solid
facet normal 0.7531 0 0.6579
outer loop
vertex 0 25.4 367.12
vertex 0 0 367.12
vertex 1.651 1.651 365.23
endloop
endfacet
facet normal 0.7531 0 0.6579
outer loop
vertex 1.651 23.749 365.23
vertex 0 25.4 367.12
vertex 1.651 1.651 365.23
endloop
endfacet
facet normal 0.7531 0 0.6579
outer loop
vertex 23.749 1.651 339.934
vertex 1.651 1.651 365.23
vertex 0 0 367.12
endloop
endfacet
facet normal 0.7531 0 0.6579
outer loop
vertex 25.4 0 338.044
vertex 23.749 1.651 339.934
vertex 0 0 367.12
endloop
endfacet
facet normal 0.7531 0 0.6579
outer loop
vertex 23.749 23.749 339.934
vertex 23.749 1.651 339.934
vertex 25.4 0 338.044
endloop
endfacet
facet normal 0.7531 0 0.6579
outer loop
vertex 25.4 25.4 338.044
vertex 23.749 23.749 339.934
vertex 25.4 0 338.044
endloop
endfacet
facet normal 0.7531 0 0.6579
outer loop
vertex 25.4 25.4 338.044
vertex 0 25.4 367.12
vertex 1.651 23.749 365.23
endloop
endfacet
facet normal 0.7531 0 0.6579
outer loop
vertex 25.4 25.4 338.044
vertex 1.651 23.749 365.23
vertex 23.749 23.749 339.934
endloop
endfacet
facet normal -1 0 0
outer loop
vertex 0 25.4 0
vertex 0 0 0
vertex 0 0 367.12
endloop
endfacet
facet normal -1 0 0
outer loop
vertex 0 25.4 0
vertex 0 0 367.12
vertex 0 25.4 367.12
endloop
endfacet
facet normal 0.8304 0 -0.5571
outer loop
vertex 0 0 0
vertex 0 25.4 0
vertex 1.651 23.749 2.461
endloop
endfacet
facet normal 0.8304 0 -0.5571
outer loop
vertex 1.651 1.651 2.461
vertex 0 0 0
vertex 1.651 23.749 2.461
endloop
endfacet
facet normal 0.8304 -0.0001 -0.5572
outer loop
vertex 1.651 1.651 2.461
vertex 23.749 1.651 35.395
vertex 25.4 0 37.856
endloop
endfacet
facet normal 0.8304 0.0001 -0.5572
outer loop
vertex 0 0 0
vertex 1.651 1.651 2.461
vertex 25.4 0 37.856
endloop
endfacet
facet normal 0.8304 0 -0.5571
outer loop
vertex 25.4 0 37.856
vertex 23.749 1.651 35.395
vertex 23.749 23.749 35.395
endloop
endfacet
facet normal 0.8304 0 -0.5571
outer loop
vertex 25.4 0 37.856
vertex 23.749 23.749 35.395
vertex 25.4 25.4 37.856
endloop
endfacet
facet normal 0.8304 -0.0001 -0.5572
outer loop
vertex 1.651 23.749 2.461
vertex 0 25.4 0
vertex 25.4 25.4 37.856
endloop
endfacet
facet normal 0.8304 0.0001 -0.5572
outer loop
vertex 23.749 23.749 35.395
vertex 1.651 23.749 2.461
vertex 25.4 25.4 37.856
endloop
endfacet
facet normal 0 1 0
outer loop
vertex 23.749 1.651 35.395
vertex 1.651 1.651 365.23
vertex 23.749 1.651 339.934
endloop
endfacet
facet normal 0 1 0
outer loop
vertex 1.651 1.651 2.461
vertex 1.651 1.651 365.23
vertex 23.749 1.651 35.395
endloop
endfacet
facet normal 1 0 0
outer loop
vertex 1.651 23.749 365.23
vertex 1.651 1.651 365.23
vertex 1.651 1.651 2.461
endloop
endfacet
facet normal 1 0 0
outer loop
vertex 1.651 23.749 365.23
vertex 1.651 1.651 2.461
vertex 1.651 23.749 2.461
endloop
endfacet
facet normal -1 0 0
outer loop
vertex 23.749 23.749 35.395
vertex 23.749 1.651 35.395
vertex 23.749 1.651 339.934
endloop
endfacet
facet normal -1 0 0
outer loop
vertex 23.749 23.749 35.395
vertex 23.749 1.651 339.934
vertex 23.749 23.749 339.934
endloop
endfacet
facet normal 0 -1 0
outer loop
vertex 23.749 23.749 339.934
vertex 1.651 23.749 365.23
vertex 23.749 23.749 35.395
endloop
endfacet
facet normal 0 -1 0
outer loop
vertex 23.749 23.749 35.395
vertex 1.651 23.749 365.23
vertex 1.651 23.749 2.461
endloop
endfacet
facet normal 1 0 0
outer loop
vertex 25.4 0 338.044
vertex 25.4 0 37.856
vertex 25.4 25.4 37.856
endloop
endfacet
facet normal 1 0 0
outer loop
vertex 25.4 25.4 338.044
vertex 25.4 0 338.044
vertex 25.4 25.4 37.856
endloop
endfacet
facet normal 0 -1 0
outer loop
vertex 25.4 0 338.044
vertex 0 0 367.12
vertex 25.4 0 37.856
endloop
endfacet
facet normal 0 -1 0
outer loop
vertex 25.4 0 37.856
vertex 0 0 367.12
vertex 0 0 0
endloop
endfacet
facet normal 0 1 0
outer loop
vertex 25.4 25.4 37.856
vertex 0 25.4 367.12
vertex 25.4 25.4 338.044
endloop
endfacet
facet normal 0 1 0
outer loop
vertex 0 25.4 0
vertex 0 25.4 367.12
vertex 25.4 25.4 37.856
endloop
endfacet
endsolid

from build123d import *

# Parameters (mm, degrees)
SKETCH1_W           = 25.4
SKETCH1_H           = 25.4
BOSS_EXTRUDE1_DEPTH = 367.12
CUT_EXTRUDE1_DEPTH  = 380
CUT_EXTRUDE2_DEPTH  = 380
SHELL1_T            = -1.651


with BuildPart() as part:
    # Sketch1 → Boss-Extrude1 (new body)
    with BuildSketch(Plane.XY):
        with Locations((12.7, 12.7)):
            Rectangle(SKETCH1_W, SKETCH1_H)
    extrude(amount=BOSS_EXTRUDE1_DEPTH)

    # Sketch2 → Cut-Extrude1 (cut)
    with BuildSketch(Plane(origin=(0, 25.4, 0), x_dir=(1, 0, 0), z_dir=(0, 1, 0))):
        Polygon((0, 0), (25.4, -37.855551052), (25.4, 0), align=None)
    extrude(amount=-CUT_EXTRUDE1_DEPTH, mode=Mode.SUBTRACT)

    # Sketch3 → Cut-Extrude2 (cut)
    with BuildSketch(Plane(origin=(0, 25.4, 0), x_dir=(1, 0, 0), z_dir=(0, 1, 0))):
        Polygon((0, -367.12), (25.4, -338.043933141), (25.4, -367.12), align=None)
    extrude(amount=-CUT_EXTRUDE2_DEPTH, mode=Mode.SUBTRACT)

    # Shell1
    shell1_openings = [part.faces().sort_by_distance(p)[0] for p in [
        (12.7, 12.7, 18.927775526),
        (12.7, 12.7, 352.58196657),
    ]]
    offset(amount=SHELL1_T, openings=shell1_openings, kind=Kind.INTERSECTION)


solid = part.part
